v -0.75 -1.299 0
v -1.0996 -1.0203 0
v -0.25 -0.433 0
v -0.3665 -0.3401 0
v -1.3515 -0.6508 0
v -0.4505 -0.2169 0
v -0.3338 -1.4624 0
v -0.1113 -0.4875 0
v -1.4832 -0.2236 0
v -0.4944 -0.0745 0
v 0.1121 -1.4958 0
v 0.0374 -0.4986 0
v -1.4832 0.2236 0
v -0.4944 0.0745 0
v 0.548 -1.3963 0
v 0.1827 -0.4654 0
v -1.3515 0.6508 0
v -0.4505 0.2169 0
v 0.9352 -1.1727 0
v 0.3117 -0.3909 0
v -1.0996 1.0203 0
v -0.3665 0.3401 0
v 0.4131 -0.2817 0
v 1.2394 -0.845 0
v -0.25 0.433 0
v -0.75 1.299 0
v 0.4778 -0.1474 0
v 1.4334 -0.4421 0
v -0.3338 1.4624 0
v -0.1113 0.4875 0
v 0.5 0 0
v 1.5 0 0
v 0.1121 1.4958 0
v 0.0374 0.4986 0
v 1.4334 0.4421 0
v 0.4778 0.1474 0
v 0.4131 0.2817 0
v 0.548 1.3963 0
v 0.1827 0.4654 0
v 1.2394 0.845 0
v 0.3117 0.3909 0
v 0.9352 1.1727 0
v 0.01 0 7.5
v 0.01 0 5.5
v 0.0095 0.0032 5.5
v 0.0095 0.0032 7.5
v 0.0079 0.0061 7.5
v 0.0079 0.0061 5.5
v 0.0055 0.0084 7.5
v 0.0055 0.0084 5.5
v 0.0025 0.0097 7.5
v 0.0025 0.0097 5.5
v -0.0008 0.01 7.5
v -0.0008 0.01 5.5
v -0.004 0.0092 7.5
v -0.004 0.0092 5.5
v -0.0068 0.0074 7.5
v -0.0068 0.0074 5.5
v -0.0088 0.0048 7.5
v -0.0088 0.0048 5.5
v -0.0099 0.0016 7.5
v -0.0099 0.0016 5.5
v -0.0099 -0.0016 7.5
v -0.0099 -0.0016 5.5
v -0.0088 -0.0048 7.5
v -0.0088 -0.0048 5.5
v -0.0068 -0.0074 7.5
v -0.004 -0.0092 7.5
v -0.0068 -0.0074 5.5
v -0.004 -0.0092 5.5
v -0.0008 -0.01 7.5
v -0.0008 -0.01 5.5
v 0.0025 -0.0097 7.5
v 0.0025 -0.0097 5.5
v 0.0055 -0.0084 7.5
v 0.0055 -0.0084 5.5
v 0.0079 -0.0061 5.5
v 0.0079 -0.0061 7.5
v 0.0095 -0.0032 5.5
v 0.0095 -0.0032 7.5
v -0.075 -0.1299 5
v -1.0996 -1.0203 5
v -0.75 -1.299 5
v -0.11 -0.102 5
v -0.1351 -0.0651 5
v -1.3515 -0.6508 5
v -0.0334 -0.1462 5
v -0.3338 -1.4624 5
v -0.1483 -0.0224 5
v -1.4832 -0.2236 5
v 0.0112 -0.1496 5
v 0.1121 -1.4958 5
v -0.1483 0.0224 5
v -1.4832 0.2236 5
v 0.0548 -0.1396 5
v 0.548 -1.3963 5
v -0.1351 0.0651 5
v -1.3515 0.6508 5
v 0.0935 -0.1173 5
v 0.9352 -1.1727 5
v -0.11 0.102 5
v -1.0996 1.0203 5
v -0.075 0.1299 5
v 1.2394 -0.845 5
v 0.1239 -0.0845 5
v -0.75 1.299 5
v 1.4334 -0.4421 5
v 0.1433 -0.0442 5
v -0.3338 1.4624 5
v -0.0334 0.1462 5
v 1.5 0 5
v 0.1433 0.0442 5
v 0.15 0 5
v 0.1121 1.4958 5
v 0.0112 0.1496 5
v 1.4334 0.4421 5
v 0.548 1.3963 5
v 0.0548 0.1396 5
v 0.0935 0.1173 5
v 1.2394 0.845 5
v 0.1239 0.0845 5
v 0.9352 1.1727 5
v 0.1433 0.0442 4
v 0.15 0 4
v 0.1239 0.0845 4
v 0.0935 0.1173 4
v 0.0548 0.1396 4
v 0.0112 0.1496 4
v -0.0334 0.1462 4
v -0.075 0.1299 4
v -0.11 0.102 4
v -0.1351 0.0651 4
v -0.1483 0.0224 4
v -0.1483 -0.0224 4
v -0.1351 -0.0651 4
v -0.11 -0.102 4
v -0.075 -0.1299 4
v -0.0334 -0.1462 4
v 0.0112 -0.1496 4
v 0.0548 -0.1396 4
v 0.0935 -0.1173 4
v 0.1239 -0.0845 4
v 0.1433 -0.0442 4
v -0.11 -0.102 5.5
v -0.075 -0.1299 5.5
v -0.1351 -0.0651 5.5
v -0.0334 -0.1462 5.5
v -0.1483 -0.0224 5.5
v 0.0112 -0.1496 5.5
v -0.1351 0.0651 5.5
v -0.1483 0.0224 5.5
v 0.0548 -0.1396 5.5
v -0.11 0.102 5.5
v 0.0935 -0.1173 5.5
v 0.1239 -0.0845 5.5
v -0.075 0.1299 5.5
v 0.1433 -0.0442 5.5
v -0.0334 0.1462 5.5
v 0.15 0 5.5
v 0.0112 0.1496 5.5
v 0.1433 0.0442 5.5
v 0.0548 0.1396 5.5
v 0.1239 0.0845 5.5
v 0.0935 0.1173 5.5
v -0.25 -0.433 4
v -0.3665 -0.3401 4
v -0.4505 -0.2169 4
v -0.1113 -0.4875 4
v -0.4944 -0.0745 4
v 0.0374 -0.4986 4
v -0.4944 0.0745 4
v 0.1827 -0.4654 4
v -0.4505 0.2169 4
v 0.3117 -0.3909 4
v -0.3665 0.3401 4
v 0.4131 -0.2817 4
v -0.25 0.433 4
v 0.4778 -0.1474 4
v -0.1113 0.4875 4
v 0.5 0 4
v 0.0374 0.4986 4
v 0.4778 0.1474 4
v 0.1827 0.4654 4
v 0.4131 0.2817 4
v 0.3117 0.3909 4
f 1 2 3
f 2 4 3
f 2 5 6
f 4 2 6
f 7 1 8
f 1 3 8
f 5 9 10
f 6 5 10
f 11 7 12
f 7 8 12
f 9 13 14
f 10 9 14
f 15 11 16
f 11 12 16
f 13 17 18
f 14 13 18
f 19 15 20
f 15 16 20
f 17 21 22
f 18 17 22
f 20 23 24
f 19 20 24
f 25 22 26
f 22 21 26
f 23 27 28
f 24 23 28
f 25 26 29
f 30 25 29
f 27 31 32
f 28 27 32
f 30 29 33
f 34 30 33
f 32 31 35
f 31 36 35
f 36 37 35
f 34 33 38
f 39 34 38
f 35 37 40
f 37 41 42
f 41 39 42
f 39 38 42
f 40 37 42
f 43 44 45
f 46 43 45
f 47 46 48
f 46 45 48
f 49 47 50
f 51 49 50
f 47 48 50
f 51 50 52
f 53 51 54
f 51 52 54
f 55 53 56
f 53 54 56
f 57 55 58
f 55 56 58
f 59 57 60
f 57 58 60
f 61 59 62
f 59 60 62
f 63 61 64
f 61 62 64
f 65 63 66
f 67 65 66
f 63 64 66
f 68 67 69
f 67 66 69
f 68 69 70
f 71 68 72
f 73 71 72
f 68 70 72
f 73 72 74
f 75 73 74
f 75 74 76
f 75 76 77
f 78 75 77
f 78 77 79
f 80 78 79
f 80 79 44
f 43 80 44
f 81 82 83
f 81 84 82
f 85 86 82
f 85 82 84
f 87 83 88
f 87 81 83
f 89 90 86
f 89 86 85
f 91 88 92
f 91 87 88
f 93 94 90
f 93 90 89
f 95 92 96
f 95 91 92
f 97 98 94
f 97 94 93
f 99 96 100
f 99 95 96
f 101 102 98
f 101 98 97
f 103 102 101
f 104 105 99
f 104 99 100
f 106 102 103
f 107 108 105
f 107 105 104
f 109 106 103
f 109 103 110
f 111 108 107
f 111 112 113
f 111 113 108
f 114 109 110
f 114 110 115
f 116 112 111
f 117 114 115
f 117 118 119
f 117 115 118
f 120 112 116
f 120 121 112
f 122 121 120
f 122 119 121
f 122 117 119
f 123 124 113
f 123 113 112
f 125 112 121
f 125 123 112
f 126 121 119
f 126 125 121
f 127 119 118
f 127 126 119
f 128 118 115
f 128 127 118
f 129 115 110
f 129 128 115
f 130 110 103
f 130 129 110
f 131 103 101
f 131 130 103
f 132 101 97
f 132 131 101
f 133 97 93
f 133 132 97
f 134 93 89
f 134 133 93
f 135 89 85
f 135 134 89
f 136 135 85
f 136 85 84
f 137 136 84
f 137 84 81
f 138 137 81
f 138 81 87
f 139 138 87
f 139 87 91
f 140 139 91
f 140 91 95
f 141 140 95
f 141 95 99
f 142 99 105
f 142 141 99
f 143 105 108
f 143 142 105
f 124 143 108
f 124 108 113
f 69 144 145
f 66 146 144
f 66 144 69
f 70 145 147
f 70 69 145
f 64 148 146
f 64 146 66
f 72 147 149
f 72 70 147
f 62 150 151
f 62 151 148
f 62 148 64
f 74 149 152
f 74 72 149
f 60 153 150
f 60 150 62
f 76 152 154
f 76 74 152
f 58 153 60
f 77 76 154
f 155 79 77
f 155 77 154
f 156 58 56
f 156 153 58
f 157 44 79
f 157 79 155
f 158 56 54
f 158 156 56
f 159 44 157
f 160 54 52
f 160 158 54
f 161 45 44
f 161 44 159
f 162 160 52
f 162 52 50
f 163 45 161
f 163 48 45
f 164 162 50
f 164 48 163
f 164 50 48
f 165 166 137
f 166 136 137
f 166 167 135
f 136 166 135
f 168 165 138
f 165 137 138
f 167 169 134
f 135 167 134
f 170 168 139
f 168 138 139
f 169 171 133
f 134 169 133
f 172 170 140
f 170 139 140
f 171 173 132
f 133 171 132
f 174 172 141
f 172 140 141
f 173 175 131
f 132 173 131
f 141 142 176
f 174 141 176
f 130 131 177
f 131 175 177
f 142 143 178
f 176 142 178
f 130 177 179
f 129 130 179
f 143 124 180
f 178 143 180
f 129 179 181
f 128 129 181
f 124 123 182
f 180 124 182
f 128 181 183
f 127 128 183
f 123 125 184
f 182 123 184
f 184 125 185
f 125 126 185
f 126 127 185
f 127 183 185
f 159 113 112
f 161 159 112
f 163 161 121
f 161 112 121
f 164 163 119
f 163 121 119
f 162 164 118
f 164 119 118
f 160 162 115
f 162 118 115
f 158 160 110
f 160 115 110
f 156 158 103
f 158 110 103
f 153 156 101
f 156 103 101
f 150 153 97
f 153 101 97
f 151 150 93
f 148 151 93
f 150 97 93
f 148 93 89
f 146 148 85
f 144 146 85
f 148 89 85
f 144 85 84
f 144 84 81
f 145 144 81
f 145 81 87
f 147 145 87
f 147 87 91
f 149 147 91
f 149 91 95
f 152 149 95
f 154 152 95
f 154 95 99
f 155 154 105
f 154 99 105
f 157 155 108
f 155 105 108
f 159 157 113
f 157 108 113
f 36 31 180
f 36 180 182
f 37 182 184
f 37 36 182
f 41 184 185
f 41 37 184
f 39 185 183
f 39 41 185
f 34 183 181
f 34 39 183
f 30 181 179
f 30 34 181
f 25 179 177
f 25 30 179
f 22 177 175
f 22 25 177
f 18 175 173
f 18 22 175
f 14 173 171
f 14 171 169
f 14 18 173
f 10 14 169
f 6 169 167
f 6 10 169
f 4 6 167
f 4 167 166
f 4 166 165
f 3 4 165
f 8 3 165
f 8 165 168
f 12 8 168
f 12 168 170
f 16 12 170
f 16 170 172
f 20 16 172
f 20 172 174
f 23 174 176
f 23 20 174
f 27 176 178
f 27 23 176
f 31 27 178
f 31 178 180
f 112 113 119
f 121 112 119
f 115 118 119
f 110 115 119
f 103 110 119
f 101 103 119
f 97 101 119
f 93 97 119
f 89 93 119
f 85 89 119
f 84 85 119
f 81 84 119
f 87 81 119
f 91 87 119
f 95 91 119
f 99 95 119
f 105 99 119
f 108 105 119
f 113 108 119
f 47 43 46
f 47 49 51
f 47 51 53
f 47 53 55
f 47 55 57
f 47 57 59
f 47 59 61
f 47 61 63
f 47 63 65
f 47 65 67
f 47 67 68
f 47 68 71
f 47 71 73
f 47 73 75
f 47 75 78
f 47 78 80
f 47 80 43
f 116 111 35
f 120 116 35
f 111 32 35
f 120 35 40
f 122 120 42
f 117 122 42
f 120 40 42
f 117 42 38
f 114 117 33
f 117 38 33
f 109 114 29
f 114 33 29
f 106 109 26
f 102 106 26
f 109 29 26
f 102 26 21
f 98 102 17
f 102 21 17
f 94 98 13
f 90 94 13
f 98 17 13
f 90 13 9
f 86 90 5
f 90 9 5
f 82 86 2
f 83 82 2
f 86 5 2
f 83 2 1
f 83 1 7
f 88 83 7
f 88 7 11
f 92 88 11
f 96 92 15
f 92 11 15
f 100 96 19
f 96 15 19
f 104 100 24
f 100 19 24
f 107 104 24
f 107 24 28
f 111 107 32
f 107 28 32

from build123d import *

# Parameters (mm, degrees)
SKETCH1_R           = 1.5
SKETCH1_R_2         = 0.5
BOSS_EXTRUDE1_DEPTH = 4
SKETCH2_R           = 1.5
SKETCH2_R_2         = 0.15
BOSS_EXTRUDE2_DEPTH = 1
SKETCH3_R           = 0.15
BOSS_EXTRUDE3_DEPTH = 0.5
SKETCH4_R           = 0.01
BOSS_EXTRUDE5_DEPTH = 2


with BuildPart() as part:
    # Sketch1 → Boss-Extrude1 (new body)
    with BuildSketch(Plane.XY):
        Circle(SKETCH1_R)
        Circle(SKETCH1_R_2, mode=Mode.SUBTRACT)
    extrude(amount=BOSS_EXTRUDE1_DEPTH)

    # Sketch2 → Boss-Extrude2 (add)
    with BuildSketch(Plane.XY.offset(4)):
        Circle(SKETCH2_R)
        Circle(SKETCH2_R_2, mode=Mode.SUBTRACT)
    extrude(amount=BOSS_EXTRUDE2_DEPTH)


with BuildPart() as body_2:
    # Sketch3 → Boss-Extrude3 (new body)
    with BuildSketch(Plane.XY.offset(5)):
        Circle(SKETCH3_R)
    extrude(amount=BOSS_EXTRUDE3_DEPTH)

    # Sketch4 → Boss-Extrude5 (add)
    with BuildSketch(Plane.XY.offset(5.5)):
        Circle(SKETCH4_R)
    extrude(amount=BOSS_EXTRUDE5_DEPTH)


solid = Compound([part.part, body_2.part])
